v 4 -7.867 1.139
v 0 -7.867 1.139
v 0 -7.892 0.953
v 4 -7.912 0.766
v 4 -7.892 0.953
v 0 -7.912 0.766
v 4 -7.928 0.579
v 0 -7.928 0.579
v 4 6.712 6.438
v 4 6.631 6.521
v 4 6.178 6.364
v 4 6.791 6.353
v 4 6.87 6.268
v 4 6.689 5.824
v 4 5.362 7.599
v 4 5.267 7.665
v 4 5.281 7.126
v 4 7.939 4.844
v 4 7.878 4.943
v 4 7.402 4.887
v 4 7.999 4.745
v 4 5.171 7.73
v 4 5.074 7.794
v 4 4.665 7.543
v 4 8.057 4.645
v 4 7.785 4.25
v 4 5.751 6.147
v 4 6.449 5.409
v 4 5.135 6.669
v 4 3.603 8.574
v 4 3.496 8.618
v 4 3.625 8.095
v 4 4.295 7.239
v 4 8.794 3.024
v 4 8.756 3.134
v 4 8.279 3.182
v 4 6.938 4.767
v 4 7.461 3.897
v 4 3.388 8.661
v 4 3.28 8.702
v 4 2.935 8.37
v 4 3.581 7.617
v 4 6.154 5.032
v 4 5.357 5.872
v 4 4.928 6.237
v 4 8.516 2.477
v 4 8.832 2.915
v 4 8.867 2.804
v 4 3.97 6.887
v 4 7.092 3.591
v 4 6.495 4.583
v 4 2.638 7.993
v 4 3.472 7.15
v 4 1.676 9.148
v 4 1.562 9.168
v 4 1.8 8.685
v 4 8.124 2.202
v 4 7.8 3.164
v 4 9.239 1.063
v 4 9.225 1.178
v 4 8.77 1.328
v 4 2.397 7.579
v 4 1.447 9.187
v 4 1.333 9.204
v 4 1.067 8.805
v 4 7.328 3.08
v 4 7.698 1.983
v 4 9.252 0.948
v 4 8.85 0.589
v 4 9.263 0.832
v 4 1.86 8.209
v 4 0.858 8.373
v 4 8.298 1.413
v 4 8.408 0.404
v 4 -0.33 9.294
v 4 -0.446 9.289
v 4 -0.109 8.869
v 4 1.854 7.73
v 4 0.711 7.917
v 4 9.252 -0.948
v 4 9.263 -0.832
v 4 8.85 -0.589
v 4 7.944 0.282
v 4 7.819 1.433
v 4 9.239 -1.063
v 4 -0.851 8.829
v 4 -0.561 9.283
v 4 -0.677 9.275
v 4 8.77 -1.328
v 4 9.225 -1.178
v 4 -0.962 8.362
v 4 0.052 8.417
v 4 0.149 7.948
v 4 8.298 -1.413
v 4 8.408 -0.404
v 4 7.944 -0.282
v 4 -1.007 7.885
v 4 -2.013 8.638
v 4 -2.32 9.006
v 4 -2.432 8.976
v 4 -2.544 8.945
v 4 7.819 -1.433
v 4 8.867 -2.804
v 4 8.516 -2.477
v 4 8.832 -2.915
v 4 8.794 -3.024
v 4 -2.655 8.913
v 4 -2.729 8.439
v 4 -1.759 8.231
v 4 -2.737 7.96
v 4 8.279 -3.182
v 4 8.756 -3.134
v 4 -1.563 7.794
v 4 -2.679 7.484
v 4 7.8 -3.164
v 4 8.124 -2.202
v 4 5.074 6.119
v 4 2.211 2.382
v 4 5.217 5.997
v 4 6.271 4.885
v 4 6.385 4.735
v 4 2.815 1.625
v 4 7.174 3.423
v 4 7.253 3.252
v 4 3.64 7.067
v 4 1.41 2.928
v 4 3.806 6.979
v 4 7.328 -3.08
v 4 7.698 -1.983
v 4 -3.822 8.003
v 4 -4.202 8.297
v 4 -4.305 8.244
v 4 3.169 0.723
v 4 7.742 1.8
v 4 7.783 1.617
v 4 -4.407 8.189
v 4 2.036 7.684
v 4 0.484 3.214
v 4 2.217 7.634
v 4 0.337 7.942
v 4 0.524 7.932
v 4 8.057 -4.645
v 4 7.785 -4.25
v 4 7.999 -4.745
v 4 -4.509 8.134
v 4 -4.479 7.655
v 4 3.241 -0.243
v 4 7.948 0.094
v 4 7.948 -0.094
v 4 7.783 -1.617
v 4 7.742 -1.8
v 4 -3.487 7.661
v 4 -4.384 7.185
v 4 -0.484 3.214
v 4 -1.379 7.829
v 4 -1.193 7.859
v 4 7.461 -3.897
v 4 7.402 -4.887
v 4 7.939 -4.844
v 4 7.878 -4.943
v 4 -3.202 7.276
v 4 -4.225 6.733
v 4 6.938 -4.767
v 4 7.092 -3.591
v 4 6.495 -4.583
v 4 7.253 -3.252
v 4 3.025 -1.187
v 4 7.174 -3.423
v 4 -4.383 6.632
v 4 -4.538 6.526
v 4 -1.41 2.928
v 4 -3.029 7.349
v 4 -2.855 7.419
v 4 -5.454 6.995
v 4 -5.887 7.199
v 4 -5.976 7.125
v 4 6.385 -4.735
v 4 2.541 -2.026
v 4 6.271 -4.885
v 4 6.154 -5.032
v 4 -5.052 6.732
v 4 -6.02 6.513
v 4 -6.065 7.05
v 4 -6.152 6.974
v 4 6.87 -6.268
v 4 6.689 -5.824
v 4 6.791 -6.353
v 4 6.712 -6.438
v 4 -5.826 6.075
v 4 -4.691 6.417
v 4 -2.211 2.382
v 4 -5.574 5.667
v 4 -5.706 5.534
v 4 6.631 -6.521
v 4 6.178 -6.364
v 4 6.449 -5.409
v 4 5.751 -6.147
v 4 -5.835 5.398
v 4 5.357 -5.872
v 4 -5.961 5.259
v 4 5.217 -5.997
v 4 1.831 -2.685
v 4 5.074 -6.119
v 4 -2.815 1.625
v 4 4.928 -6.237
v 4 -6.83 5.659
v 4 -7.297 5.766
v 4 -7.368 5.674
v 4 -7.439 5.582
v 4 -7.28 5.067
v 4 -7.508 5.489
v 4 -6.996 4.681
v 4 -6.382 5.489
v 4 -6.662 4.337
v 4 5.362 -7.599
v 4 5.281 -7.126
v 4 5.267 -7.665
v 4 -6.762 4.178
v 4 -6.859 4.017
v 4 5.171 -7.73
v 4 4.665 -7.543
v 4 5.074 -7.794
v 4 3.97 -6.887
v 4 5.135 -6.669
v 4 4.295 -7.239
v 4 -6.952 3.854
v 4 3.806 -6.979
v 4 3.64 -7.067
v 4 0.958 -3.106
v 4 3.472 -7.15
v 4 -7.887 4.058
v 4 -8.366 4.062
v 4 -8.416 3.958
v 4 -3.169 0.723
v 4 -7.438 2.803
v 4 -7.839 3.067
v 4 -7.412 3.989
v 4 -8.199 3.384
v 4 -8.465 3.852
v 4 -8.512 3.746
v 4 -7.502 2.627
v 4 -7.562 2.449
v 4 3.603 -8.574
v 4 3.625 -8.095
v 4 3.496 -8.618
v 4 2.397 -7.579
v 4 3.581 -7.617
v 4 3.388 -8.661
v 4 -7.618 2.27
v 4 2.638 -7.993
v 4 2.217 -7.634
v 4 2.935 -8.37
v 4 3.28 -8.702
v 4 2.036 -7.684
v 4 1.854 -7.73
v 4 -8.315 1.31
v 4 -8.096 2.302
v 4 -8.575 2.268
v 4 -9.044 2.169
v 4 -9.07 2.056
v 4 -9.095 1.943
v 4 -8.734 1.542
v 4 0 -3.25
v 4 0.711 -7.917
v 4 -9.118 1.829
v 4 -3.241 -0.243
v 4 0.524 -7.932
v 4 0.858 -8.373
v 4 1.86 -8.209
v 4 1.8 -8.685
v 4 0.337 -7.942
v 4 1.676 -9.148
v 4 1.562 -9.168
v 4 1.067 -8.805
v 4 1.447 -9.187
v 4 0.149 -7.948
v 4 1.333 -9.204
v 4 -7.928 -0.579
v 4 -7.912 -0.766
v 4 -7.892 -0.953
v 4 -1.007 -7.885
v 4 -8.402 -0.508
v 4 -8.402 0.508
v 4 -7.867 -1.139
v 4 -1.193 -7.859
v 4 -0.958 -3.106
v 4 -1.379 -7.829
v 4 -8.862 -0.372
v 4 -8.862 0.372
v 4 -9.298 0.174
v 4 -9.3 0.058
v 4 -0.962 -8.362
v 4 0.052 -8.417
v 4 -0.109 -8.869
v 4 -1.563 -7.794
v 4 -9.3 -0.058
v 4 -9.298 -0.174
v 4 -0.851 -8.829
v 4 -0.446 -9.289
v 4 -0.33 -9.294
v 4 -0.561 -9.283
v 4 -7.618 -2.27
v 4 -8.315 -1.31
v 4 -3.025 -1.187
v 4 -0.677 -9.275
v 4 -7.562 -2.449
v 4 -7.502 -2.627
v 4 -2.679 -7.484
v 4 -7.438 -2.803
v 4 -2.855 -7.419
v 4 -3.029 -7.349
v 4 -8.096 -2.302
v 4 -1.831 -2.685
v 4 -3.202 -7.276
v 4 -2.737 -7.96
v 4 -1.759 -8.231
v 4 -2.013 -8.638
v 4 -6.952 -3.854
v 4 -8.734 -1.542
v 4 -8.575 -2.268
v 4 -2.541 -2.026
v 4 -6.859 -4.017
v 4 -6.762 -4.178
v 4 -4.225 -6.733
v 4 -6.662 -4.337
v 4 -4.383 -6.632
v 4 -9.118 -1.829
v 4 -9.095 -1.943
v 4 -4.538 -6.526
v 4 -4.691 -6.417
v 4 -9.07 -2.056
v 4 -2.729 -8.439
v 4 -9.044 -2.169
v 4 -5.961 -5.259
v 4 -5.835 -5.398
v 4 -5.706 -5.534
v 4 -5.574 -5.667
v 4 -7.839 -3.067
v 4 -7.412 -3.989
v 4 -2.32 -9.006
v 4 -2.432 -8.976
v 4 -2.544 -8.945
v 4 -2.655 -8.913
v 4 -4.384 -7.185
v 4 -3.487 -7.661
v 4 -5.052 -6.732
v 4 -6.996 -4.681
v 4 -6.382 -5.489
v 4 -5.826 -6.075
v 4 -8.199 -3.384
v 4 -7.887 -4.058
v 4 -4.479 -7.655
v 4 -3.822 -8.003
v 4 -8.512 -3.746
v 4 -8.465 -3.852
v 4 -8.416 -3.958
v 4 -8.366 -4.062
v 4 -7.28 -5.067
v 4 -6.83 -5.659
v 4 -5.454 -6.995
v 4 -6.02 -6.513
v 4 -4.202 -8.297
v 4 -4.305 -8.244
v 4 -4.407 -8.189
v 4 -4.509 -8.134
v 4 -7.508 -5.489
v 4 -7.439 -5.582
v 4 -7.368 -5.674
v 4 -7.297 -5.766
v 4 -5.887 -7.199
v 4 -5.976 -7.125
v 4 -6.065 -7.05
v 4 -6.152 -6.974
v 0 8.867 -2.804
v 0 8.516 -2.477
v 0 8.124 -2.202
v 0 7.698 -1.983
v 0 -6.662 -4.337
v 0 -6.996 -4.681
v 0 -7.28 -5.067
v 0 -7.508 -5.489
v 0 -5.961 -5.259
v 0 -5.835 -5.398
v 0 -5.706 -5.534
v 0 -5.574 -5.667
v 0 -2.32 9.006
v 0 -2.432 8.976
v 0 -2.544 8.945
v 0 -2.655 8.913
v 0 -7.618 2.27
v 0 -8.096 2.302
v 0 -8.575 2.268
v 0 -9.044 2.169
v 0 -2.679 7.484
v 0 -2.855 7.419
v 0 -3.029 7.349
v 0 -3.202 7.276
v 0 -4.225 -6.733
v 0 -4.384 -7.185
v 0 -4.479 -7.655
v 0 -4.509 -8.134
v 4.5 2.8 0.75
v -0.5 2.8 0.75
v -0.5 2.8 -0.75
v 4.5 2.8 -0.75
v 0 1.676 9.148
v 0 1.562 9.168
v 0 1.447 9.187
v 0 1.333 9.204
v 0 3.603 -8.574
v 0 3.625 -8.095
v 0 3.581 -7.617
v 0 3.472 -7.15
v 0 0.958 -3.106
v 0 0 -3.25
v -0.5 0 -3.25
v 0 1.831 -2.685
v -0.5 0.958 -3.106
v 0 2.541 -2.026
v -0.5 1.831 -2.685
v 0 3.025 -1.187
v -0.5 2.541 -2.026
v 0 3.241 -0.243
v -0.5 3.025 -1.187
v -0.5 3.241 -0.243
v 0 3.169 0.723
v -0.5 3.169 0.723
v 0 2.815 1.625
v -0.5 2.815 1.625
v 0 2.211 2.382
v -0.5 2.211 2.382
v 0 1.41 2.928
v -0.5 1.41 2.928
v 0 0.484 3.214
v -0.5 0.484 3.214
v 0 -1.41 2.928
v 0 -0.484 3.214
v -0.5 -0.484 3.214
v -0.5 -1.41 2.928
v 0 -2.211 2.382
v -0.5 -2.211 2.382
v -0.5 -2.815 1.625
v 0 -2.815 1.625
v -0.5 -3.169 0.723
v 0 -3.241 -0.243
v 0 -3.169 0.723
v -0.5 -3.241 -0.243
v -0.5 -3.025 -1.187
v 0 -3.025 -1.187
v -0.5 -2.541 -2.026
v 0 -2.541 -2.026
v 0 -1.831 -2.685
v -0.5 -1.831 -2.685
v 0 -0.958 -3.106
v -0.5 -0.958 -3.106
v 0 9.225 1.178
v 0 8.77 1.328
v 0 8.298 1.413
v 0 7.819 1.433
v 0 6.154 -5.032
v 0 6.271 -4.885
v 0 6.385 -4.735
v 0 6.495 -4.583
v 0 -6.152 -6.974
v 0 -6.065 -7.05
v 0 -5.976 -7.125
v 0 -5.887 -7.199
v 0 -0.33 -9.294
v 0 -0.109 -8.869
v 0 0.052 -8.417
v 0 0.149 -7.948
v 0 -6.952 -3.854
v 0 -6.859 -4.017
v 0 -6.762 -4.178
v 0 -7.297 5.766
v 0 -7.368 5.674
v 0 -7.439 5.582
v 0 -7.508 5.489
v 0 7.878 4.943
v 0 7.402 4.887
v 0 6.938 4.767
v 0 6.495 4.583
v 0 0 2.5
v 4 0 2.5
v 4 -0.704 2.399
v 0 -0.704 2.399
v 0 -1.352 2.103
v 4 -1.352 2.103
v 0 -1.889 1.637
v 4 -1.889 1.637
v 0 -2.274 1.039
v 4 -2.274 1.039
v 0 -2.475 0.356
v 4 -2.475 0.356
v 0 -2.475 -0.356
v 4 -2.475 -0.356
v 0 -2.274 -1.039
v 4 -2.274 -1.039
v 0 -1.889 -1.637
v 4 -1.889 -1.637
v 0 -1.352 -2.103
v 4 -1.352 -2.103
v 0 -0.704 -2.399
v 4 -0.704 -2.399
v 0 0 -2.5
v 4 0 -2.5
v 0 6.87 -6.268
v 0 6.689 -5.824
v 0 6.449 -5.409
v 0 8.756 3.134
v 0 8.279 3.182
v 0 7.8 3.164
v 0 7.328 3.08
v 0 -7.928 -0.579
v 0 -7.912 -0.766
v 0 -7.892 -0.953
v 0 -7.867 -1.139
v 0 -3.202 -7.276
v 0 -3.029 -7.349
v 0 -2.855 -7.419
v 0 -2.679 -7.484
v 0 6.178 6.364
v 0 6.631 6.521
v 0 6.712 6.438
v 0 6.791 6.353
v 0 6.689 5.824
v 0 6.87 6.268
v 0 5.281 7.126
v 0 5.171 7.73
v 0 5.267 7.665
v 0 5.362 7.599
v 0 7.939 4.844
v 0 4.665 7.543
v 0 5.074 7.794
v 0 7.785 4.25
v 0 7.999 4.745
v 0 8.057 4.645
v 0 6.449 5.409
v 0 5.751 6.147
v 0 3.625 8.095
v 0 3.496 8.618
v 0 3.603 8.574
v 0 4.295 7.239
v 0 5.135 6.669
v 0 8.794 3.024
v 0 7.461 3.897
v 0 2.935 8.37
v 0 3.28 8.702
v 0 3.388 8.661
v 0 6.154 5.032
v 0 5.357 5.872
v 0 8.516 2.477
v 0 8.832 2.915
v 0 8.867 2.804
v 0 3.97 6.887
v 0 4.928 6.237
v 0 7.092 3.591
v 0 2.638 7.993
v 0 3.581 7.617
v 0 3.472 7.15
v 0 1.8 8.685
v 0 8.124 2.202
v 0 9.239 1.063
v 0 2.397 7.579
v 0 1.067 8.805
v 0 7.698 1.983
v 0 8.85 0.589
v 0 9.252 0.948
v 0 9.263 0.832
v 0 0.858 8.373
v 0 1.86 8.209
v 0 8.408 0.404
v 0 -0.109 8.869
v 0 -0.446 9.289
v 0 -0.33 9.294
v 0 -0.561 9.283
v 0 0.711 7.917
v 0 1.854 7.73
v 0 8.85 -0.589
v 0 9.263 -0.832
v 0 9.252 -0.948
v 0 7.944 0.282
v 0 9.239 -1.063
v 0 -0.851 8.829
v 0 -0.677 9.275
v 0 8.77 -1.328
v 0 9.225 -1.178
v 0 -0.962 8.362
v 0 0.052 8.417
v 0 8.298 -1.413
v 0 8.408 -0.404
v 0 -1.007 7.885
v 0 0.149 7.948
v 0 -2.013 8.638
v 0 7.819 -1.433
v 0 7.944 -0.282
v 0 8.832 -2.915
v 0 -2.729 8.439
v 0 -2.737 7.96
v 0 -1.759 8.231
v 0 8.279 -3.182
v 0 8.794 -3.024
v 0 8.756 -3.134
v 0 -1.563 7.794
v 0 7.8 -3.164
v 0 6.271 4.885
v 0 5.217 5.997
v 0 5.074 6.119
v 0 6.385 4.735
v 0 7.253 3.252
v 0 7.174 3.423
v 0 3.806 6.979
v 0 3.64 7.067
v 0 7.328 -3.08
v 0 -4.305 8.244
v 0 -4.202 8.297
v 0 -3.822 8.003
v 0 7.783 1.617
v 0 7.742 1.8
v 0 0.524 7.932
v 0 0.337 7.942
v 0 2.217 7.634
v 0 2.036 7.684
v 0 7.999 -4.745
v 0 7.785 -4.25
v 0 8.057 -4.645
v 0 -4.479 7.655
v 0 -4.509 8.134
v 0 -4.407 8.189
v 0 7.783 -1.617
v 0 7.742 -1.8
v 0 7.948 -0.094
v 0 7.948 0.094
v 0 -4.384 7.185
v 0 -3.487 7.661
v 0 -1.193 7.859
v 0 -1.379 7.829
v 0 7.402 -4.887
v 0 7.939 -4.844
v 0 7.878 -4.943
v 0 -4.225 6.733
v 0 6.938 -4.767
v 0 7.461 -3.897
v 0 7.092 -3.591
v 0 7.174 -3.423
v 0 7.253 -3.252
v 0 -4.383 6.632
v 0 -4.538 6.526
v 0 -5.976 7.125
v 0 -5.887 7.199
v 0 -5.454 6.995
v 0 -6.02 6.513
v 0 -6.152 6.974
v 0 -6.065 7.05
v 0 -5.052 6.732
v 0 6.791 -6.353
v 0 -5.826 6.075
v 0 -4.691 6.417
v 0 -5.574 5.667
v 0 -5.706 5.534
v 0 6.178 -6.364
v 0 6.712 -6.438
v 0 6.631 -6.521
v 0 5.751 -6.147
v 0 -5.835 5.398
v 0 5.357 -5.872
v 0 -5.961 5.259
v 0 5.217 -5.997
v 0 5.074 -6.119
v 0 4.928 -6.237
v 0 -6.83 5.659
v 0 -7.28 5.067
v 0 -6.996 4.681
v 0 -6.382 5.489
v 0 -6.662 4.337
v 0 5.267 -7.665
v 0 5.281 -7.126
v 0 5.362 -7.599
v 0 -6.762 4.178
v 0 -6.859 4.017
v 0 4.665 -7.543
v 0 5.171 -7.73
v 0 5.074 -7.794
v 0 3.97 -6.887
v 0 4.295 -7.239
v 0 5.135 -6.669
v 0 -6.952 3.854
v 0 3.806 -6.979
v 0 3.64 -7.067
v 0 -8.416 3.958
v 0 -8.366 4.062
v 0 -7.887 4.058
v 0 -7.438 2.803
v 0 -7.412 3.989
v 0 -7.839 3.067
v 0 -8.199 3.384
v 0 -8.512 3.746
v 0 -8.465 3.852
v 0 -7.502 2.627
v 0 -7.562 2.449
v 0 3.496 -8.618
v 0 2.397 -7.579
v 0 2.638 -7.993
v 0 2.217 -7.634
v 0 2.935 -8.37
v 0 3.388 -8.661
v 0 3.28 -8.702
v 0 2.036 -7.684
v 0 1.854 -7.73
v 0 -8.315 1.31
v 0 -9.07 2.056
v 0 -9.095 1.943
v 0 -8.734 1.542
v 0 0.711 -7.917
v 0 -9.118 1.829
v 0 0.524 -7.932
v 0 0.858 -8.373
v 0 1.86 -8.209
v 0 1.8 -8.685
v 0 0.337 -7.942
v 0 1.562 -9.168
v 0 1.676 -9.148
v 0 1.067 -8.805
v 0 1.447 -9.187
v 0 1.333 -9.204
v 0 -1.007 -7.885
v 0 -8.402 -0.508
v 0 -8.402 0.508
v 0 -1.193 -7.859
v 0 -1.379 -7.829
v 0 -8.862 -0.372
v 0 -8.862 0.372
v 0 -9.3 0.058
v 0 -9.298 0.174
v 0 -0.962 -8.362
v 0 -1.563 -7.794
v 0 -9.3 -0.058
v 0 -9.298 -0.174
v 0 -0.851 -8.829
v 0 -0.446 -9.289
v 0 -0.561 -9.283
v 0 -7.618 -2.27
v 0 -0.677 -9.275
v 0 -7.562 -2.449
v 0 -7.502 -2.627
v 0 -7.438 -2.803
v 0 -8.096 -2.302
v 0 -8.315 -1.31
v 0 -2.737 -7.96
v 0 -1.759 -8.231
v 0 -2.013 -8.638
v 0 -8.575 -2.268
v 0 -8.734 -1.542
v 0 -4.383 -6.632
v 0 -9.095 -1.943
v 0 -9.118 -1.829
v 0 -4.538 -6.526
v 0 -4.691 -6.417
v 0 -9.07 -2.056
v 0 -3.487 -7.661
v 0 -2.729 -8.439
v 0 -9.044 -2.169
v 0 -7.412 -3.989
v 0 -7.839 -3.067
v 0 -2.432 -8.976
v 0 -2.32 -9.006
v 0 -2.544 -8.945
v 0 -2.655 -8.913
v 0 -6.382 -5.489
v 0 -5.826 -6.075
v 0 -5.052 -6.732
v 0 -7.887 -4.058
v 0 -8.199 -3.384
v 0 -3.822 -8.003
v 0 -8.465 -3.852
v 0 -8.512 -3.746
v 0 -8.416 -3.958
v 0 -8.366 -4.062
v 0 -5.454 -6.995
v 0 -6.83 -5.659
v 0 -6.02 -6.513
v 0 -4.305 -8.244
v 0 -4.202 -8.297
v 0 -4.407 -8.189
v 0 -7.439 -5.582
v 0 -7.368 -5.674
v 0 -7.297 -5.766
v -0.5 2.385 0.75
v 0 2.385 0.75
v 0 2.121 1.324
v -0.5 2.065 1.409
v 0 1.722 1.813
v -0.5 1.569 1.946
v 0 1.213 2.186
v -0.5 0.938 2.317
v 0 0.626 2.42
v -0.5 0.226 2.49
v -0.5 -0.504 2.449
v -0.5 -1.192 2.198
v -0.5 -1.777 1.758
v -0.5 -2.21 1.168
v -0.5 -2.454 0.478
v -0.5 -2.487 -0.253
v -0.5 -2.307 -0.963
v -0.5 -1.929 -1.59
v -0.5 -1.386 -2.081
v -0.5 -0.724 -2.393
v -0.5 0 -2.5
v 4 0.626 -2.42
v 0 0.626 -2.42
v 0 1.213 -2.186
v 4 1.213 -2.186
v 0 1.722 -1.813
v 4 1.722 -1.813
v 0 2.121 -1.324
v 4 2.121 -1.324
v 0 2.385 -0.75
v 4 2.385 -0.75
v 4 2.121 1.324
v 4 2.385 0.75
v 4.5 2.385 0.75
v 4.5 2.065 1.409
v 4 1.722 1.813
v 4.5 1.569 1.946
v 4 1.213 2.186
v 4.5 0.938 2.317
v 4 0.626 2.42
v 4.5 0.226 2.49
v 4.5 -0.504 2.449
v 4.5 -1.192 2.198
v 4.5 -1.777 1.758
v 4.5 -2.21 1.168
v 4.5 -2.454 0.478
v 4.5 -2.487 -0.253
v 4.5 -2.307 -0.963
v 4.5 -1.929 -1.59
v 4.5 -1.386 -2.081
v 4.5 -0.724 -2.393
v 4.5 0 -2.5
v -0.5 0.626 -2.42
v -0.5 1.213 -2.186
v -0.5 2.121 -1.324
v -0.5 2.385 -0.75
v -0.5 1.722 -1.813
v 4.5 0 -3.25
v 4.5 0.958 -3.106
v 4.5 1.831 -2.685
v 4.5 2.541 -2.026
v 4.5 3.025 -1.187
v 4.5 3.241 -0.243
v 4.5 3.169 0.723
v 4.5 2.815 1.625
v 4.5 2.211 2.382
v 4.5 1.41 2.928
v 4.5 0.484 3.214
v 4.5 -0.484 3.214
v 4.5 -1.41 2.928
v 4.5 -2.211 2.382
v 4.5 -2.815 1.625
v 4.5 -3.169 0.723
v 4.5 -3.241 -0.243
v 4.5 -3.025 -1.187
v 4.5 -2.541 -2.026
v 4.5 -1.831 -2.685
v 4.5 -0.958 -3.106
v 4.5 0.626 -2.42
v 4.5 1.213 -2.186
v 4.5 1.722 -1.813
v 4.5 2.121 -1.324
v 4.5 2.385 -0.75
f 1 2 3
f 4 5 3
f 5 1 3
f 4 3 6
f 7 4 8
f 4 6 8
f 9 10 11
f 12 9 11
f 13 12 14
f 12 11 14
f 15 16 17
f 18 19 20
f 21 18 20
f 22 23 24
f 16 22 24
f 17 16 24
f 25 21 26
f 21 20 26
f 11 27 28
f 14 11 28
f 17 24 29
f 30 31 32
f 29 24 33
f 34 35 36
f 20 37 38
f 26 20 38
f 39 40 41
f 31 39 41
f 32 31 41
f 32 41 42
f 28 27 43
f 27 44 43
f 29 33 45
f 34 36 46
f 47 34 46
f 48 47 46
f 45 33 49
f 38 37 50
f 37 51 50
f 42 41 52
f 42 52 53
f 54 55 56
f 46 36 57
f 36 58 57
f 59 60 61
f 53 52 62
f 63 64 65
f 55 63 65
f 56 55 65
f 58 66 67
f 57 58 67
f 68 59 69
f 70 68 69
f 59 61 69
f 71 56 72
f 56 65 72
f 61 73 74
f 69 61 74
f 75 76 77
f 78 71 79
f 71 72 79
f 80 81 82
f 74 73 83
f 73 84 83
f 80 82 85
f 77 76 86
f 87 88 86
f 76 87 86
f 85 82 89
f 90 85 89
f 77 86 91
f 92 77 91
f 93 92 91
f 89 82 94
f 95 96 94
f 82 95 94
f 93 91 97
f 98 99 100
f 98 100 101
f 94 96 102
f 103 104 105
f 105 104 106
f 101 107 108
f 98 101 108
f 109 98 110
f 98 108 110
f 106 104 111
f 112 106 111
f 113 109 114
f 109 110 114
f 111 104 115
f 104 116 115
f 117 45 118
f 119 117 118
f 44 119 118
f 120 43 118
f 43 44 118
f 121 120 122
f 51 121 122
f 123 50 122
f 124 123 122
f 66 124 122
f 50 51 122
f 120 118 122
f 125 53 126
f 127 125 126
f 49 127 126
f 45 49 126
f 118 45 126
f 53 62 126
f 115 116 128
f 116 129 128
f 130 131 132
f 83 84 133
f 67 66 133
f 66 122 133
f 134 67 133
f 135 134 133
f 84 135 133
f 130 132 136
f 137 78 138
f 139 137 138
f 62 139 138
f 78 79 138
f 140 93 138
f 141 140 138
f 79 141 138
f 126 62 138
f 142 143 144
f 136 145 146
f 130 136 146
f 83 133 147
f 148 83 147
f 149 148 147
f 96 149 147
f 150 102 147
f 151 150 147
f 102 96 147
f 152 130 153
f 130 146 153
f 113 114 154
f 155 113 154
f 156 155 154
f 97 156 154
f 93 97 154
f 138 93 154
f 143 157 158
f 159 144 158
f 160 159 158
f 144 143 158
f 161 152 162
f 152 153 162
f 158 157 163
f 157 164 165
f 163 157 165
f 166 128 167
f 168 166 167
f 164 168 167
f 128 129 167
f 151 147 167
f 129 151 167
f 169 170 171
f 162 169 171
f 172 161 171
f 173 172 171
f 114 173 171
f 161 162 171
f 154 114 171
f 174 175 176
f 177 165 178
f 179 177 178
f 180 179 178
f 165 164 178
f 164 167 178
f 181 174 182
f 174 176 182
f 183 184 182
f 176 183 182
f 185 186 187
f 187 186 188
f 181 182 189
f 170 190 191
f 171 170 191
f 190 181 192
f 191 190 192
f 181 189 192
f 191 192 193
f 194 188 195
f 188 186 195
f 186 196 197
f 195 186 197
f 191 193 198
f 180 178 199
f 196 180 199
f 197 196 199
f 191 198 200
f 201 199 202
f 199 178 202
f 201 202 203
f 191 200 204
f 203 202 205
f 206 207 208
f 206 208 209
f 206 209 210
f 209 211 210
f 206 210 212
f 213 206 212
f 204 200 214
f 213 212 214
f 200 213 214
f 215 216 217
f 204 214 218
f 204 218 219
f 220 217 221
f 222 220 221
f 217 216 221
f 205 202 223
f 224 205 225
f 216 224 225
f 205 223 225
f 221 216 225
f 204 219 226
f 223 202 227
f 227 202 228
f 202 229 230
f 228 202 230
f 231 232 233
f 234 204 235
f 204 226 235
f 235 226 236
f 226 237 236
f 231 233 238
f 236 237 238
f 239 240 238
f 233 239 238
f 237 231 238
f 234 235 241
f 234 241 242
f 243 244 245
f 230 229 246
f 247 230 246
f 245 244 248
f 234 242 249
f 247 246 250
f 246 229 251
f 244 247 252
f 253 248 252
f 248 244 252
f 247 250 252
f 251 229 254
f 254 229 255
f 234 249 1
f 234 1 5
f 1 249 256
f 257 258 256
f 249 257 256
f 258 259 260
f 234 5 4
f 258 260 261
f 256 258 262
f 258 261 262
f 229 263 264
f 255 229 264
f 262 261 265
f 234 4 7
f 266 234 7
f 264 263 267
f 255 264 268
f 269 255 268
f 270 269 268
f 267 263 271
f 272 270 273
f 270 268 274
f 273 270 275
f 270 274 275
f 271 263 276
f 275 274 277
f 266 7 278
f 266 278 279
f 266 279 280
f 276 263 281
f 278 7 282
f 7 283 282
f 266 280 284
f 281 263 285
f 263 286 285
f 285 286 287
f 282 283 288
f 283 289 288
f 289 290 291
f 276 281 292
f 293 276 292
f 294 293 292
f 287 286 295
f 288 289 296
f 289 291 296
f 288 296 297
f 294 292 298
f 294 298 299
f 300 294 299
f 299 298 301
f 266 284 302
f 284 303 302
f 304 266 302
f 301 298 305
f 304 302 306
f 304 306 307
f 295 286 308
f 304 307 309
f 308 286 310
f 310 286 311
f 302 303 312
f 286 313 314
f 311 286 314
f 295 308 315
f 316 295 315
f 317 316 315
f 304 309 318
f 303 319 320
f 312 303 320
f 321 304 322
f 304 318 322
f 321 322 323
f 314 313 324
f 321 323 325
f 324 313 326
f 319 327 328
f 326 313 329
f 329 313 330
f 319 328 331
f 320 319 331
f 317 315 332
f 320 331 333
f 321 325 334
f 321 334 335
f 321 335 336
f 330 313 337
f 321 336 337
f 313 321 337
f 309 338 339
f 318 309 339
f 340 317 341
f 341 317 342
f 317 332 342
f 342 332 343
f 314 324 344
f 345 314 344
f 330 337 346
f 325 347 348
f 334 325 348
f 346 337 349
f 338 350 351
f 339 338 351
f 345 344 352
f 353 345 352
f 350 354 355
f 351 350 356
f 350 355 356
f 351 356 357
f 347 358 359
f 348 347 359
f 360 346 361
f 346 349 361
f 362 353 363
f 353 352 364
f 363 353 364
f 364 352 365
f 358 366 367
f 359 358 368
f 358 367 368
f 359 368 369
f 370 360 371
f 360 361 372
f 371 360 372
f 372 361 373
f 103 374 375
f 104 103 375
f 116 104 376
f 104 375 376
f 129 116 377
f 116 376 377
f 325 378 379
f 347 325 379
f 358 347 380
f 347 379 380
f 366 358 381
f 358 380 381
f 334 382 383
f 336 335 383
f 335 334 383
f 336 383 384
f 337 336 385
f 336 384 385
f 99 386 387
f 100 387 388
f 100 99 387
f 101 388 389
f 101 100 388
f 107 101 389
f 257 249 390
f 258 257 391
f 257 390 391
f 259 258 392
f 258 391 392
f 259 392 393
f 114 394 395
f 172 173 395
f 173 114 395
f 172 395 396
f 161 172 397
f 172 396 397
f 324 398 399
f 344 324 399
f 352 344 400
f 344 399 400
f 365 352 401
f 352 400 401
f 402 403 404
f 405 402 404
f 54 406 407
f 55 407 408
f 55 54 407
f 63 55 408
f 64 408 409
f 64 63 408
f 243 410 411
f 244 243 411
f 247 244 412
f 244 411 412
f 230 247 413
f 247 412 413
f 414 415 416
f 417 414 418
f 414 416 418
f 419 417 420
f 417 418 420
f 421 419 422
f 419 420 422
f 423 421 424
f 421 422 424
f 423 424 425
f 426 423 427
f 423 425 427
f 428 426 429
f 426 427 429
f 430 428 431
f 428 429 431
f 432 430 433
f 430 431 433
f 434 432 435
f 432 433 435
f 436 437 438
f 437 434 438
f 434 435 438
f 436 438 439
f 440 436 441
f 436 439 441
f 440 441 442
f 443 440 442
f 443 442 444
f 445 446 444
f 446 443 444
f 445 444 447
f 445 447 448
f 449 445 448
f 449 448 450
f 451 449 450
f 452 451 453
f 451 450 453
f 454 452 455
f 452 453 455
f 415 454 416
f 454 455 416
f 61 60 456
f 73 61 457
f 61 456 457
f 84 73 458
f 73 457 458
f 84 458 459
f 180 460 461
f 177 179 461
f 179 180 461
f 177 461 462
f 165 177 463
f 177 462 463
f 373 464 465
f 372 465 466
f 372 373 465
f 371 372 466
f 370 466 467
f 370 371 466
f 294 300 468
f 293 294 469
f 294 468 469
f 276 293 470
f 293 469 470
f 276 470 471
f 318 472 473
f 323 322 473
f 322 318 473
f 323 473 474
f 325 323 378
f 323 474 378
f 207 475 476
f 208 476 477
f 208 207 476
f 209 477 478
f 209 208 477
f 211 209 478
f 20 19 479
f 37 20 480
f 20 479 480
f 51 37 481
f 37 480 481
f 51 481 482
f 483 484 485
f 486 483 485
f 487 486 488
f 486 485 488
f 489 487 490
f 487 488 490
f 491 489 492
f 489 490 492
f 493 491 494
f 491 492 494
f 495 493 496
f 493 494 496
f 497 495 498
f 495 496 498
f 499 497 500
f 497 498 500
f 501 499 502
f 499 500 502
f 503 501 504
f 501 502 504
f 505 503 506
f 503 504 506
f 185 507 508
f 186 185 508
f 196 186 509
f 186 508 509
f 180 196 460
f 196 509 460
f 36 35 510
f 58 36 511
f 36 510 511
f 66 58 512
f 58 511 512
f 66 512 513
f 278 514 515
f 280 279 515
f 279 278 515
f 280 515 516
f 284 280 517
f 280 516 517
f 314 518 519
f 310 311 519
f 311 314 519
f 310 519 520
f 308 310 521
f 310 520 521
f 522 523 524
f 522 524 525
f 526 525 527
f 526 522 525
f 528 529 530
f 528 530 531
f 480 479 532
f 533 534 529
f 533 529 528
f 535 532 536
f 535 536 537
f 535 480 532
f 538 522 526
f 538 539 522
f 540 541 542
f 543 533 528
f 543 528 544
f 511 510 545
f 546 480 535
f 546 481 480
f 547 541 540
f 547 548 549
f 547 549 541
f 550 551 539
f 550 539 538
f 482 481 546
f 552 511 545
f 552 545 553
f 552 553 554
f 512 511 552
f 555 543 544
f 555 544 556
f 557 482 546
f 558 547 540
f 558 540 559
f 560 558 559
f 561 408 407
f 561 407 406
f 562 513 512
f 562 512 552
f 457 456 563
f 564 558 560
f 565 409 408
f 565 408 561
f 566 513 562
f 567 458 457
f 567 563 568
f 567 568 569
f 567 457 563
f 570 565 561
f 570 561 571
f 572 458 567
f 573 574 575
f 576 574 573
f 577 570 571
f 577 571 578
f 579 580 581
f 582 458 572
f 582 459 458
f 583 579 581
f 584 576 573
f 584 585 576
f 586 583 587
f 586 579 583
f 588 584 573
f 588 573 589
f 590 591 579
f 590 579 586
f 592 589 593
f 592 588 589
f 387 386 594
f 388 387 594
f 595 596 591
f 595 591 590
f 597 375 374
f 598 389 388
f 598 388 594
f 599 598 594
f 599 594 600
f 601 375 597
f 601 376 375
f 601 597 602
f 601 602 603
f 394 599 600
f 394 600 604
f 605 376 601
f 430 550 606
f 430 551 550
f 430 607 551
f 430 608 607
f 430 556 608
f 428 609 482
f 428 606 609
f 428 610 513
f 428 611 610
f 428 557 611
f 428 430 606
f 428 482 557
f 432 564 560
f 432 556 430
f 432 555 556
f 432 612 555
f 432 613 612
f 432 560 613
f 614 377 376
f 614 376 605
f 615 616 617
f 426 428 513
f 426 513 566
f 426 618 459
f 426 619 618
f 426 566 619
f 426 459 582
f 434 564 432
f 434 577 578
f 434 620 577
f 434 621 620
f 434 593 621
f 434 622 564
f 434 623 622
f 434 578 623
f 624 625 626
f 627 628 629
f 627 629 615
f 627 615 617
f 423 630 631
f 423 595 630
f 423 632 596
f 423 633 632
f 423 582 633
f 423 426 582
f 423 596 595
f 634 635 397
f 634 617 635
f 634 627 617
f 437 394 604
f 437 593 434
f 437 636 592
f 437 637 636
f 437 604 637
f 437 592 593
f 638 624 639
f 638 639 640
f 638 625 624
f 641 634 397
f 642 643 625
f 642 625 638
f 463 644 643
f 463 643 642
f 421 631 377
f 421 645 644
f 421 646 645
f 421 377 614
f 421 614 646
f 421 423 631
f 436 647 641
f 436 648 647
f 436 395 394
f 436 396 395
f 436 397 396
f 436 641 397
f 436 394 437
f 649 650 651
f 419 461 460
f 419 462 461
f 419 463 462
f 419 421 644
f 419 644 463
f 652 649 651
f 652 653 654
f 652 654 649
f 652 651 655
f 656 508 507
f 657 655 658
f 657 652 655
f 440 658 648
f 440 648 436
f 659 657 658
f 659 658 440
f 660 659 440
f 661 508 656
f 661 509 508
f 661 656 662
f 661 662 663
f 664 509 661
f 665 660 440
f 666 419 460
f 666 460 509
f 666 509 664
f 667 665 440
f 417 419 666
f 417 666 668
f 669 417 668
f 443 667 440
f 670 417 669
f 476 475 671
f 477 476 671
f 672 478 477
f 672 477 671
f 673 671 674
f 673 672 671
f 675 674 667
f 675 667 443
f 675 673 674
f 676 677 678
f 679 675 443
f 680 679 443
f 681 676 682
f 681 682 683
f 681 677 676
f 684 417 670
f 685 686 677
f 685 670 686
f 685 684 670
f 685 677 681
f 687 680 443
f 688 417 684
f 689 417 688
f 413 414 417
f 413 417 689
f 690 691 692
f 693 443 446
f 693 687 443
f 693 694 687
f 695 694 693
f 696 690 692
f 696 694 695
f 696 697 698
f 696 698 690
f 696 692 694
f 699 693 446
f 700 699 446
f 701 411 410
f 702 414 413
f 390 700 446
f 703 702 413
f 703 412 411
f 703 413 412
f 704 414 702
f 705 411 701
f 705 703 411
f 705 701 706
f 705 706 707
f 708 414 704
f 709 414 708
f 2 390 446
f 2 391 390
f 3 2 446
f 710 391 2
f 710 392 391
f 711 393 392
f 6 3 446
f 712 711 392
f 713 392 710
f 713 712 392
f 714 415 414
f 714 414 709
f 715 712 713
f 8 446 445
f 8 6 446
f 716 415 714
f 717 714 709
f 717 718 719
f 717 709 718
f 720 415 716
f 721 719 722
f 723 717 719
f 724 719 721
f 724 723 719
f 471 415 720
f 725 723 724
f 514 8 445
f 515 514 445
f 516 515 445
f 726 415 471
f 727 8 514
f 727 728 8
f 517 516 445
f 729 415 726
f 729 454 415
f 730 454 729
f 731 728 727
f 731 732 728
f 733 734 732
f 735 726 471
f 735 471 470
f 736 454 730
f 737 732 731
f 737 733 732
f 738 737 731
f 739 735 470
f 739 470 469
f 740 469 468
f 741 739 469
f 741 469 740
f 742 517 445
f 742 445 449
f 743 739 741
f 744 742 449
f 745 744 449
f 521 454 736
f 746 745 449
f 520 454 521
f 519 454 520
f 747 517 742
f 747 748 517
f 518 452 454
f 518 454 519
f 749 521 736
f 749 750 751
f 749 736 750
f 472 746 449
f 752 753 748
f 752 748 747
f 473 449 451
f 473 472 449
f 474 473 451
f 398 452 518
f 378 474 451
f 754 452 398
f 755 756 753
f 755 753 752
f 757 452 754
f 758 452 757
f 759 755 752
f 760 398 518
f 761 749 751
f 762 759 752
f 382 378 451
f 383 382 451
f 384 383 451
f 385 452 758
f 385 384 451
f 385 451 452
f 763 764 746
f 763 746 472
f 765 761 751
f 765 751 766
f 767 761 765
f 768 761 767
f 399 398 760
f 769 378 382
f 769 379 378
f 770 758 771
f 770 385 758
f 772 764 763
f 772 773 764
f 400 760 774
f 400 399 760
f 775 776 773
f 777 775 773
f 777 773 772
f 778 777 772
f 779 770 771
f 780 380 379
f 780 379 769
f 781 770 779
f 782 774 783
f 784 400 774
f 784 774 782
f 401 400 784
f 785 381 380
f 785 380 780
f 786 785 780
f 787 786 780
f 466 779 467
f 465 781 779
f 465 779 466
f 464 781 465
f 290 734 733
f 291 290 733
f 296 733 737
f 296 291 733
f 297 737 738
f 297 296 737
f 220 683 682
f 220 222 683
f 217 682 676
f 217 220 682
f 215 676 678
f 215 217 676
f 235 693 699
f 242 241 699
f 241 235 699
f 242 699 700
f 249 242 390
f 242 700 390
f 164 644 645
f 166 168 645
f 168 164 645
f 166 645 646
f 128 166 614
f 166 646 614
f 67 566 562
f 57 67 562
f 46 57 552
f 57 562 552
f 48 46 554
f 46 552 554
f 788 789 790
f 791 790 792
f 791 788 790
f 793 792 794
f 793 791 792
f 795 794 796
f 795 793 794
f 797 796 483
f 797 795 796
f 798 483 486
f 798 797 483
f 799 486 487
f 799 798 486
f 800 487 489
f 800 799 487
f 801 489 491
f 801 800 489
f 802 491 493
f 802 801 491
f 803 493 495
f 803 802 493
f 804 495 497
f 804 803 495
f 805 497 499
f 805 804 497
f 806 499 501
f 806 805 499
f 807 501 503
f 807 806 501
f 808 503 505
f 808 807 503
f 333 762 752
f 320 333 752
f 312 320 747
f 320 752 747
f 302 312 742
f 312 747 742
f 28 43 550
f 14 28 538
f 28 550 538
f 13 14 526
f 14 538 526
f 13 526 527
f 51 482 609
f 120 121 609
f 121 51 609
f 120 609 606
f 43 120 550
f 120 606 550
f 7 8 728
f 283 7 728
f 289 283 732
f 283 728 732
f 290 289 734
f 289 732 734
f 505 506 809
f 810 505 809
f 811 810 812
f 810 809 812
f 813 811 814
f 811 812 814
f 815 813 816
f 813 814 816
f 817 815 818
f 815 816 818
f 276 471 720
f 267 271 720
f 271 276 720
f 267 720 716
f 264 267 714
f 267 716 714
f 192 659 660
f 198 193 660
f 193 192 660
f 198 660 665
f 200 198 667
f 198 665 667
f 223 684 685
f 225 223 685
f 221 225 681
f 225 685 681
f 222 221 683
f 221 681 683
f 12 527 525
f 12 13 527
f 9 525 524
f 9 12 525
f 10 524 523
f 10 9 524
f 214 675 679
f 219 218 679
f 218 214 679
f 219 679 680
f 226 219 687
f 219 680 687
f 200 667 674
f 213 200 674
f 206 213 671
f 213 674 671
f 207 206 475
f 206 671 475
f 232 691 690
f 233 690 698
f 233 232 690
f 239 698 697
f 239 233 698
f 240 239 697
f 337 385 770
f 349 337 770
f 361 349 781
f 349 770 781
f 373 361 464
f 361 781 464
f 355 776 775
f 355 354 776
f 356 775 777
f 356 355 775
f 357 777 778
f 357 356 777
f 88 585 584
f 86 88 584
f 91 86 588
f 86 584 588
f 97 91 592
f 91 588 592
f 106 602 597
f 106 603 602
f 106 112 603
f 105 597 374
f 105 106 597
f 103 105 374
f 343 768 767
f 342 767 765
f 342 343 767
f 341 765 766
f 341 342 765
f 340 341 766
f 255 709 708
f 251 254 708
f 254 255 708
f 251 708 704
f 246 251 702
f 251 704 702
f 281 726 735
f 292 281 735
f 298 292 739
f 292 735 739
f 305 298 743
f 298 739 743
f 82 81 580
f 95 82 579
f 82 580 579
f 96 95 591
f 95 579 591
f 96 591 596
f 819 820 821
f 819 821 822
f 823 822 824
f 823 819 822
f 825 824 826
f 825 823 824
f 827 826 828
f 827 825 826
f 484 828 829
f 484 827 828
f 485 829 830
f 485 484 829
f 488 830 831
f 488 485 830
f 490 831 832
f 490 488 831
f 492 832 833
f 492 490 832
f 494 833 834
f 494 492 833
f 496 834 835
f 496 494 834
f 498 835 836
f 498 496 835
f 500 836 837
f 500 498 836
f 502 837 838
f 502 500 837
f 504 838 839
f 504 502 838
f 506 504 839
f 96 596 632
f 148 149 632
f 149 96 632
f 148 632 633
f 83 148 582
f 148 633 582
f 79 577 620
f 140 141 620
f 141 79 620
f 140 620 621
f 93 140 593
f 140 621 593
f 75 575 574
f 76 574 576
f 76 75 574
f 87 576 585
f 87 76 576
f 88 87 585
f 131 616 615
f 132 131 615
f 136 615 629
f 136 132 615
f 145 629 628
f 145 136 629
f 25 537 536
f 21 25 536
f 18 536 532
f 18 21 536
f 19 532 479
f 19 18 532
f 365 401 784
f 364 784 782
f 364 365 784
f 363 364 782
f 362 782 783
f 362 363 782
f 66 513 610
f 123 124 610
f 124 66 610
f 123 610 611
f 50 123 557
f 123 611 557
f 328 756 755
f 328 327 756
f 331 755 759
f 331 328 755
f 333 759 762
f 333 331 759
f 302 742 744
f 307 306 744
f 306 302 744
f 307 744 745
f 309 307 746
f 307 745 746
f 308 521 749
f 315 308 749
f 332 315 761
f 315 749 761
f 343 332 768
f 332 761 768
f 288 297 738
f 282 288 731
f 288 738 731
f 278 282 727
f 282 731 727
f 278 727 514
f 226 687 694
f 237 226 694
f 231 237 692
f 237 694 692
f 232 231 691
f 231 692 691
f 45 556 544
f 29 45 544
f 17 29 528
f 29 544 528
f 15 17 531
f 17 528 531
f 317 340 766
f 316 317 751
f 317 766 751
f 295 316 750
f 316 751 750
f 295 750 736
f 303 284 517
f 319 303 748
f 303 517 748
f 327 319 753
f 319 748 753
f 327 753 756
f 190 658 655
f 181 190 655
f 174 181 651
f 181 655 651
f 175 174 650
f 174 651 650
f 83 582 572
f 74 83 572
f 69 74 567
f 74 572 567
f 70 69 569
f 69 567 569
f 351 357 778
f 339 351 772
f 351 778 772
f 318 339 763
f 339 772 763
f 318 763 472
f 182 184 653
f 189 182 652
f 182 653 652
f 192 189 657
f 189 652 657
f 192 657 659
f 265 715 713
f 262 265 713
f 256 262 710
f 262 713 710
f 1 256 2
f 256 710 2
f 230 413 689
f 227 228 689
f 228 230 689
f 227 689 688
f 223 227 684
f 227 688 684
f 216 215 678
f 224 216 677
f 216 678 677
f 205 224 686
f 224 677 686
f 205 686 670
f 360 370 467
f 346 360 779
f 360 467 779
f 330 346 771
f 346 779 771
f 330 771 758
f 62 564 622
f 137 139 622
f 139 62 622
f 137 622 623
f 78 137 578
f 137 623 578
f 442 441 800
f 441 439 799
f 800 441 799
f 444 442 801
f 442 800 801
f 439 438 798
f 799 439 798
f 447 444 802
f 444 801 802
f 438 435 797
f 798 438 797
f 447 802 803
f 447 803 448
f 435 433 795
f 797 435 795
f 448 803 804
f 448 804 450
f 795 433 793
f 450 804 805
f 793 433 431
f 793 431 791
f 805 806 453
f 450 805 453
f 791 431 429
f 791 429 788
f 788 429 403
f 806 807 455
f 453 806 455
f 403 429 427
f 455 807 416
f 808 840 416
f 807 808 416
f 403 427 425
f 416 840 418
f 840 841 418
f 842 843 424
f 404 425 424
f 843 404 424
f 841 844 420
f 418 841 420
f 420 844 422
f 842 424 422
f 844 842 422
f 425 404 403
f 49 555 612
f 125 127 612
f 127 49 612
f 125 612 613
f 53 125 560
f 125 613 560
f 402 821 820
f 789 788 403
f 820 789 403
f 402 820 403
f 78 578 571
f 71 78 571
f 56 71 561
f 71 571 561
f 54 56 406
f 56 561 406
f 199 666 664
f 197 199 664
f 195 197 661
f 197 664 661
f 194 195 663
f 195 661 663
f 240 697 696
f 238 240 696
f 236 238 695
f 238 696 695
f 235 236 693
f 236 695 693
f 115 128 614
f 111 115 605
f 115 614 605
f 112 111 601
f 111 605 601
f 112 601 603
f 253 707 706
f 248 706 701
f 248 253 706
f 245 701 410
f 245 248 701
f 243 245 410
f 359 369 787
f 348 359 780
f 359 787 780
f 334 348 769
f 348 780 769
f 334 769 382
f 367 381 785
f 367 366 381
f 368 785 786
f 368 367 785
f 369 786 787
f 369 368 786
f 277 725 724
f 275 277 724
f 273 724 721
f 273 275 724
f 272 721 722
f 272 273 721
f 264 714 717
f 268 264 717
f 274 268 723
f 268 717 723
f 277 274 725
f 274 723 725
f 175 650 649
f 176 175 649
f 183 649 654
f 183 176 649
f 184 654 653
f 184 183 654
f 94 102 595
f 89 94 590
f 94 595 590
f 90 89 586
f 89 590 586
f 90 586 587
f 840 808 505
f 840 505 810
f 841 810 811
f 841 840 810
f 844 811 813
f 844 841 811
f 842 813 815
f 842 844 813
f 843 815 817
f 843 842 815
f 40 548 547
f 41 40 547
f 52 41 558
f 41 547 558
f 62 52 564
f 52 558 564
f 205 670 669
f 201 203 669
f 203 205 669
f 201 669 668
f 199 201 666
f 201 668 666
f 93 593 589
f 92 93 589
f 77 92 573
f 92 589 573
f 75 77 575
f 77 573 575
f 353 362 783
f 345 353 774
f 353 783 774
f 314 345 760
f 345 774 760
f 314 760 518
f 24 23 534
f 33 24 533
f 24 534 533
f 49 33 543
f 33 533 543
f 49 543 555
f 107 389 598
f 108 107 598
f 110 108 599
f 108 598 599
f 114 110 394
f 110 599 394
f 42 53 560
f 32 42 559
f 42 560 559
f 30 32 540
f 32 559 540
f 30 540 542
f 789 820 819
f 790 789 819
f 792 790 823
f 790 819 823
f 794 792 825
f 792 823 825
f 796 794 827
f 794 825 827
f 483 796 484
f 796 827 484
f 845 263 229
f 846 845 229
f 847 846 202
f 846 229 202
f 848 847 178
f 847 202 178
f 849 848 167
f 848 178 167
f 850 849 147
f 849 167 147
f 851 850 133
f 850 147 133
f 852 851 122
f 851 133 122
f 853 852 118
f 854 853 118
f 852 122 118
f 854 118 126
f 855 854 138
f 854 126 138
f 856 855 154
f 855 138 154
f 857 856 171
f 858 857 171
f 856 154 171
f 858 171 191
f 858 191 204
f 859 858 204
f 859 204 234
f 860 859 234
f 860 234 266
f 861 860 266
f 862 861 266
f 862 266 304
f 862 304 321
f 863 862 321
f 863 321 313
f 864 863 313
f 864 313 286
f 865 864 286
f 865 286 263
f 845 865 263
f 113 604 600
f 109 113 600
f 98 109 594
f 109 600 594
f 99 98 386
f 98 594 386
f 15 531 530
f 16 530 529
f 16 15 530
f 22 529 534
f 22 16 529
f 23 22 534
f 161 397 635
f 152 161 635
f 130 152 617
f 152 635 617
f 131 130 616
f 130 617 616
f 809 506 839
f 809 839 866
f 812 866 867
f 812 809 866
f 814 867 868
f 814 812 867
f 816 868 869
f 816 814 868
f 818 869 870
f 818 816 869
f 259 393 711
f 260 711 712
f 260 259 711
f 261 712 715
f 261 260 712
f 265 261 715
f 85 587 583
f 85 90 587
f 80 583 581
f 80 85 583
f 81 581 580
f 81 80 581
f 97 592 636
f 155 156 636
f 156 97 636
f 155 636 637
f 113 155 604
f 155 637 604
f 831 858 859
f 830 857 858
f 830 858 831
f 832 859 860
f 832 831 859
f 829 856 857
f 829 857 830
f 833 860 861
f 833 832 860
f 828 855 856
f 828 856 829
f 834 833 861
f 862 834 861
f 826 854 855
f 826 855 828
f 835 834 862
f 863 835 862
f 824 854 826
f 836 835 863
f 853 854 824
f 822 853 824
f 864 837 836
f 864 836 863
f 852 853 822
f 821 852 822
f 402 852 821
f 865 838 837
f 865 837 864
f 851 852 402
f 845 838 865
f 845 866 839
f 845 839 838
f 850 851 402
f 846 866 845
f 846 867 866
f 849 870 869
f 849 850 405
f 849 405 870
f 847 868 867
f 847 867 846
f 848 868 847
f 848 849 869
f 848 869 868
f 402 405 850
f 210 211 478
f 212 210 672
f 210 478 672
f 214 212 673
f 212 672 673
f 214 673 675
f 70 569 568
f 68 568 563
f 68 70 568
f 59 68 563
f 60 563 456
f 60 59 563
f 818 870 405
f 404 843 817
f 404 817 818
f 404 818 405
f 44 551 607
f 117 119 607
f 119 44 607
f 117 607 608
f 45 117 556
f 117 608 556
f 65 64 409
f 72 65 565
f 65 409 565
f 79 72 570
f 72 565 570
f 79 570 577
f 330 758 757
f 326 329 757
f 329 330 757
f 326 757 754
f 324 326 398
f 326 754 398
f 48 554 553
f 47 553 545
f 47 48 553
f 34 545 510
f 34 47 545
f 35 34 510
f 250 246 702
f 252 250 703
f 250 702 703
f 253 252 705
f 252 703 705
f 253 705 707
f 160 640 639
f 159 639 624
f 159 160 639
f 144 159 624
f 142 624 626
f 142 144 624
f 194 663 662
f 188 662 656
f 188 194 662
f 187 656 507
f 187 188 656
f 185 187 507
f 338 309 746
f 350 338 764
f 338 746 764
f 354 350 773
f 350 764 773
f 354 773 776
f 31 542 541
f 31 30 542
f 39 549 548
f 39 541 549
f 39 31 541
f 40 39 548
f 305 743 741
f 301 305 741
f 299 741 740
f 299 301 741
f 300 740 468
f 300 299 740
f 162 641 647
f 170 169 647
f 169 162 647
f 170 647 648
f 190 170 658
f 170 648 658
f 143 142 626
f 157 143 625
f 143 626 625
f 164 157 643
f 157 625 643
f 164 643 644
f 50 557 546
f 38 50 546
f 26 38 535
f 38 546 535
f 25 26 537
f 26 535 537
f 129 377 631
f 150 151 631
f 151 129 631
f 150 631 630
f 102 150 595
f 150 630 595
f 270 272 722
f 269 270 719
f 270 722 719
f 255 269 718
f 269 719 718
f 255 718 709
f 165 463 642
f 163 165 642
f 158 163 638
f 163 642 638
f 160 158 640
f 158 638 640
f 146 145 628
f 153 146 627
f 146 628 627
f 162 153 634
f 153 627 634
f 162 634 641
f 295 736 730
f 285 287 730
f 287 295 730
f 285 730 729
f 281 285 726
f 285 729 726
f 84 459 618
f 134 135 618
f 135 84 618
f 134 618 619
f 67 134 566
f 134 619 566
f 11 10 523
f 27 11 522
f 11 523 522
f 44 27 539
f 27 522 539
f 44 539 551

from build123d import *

# Parameters (mm, degrees)
BASPROSKE_W             = 4
BASPROSKE_H             = 9.3
TOOTHCUT_DEPTH          = 14.746999673
TEETHCUTS_COUNT         = 29
TEETHCUTS_ANGLE         = 347.586206897
BORSKE_R                = 2.5
BORE_DEPTH              = 50.0000508
EXTRUDE1_DEPTH          = 4.5
EXTRUDE1_DEPTH_BACK     = 0.5
SKETCH1_R               = 3.25
SKETCH1_R_2             = 2.5
CUT_EXTRUDE1_DEPTH      = 20
CUT_EXTRUDE1_DEPTH_BACK = 14.896807231
SKETCH2_W               = 1.5
SKETCH2_H               = 2.8


with BuildPart() as part:
    # BasProSke → Base-Revolve (revolve)
    with BuildSketch(Plane(origin=(0, 0, 0), x_dir=(1, 0, 0), z_dir=(0, 1, 0))):
        with Locations((2, 4.65)):
            Rectangle(BASPROSKE_W, BASPROSKE_H)
    revolve(axis=Axis((-10, 0, 0), (1, 0, 0)))

    # TooCutSke → ToothCut (cut, through all)
    with BuildSketch(Plane(origin=(0, 0, 0), x_dir=(0, 0, -1), z_dir=(1, 0, 0))):
        with BuildLine():
            ThreePointArc((0.281517973, 7.944013383), (0, 7.949), (-0.281517973, 7.944013383))
            ThreePointArc((-0.281517973, 7.944013383), (-0.494228582, 8.645390123), (-0.84911719, 9.28666168))
            ThreePointArc((-0.84911719, 9.28666168), (0, 9.3254), (0.84911719, 9.28666168))
            ThreePointArc((0.84911719, 9.28666168), (0.494228582, 8.645390123), (0.281517973, 7.944013383))
        make_face()
    toothcut = extrude(amount=TOOTHCUT_DEPTH, mode=Mode.SUBTRACT)

    # TeethCuts: ToothCut ×29 about axis
    teethcuts_axis = Axis((-10, 0, 0), (1, 0, 0))
    for i in range(1, TEETHCUTS_COUNT):
        add(toothcut.rotate(teethcuts_axis, i * TEETHCUTS_ANGLE / (TEETHCUTS_COUNT - 1)), mode=Mode.SUBTRACT)

    # BorSke → Bore (cut, symmetric)
    with BuildSketch(Plane(origin=(0, 0, 0), x_dir=(0, 0, -1), z_dir=(1, 0, 0))):
        Circle(BORSKE_R)
    extrude(amount=BORE_DEPTH, both=True, mode=Mode.SUBTRACT)

    # Sketch1 → Extrude1 (add, two sides: drawn at the far end of the back side and taken through both)
    with BuildSketch(Plane(origin=(0, 0, 0), x_dir=(0, 0, -1), z_dir=(1, 0, 0)).offset(-EXTRUDE1_DEPTH_BACK)):
        Circle(SKETCH1_R)
        Circle(SKETCH1_R_2, mode=Mode.SUBTRACT)
    extrude(amount=EXTRUDE1_DEPTH + EXTRUDE1_DEPTH_BACK)

    # Sketch2 → Cut-Extrude1 (cut, two sides: drawn at the far end of the back side and taken through both)
    with BuildSketch(Plane(origin=(0, 0, 0), x_dir=(0, 0, -1), z_dir=(1, 0, 0)).offset(-CUT_EXTRUDE1_DEPTH_BACK)):
        with Locations((0, 1.4)):
            Rectangle(SKETCH2_W, SKETCH2_H)
    extrude(amount=CUT_EXTRUDE1_DEPTH + CUT_EXTRUDE1_DEPTH_BACK, mode=Mode.SUBTRACT)


solid = part.part
